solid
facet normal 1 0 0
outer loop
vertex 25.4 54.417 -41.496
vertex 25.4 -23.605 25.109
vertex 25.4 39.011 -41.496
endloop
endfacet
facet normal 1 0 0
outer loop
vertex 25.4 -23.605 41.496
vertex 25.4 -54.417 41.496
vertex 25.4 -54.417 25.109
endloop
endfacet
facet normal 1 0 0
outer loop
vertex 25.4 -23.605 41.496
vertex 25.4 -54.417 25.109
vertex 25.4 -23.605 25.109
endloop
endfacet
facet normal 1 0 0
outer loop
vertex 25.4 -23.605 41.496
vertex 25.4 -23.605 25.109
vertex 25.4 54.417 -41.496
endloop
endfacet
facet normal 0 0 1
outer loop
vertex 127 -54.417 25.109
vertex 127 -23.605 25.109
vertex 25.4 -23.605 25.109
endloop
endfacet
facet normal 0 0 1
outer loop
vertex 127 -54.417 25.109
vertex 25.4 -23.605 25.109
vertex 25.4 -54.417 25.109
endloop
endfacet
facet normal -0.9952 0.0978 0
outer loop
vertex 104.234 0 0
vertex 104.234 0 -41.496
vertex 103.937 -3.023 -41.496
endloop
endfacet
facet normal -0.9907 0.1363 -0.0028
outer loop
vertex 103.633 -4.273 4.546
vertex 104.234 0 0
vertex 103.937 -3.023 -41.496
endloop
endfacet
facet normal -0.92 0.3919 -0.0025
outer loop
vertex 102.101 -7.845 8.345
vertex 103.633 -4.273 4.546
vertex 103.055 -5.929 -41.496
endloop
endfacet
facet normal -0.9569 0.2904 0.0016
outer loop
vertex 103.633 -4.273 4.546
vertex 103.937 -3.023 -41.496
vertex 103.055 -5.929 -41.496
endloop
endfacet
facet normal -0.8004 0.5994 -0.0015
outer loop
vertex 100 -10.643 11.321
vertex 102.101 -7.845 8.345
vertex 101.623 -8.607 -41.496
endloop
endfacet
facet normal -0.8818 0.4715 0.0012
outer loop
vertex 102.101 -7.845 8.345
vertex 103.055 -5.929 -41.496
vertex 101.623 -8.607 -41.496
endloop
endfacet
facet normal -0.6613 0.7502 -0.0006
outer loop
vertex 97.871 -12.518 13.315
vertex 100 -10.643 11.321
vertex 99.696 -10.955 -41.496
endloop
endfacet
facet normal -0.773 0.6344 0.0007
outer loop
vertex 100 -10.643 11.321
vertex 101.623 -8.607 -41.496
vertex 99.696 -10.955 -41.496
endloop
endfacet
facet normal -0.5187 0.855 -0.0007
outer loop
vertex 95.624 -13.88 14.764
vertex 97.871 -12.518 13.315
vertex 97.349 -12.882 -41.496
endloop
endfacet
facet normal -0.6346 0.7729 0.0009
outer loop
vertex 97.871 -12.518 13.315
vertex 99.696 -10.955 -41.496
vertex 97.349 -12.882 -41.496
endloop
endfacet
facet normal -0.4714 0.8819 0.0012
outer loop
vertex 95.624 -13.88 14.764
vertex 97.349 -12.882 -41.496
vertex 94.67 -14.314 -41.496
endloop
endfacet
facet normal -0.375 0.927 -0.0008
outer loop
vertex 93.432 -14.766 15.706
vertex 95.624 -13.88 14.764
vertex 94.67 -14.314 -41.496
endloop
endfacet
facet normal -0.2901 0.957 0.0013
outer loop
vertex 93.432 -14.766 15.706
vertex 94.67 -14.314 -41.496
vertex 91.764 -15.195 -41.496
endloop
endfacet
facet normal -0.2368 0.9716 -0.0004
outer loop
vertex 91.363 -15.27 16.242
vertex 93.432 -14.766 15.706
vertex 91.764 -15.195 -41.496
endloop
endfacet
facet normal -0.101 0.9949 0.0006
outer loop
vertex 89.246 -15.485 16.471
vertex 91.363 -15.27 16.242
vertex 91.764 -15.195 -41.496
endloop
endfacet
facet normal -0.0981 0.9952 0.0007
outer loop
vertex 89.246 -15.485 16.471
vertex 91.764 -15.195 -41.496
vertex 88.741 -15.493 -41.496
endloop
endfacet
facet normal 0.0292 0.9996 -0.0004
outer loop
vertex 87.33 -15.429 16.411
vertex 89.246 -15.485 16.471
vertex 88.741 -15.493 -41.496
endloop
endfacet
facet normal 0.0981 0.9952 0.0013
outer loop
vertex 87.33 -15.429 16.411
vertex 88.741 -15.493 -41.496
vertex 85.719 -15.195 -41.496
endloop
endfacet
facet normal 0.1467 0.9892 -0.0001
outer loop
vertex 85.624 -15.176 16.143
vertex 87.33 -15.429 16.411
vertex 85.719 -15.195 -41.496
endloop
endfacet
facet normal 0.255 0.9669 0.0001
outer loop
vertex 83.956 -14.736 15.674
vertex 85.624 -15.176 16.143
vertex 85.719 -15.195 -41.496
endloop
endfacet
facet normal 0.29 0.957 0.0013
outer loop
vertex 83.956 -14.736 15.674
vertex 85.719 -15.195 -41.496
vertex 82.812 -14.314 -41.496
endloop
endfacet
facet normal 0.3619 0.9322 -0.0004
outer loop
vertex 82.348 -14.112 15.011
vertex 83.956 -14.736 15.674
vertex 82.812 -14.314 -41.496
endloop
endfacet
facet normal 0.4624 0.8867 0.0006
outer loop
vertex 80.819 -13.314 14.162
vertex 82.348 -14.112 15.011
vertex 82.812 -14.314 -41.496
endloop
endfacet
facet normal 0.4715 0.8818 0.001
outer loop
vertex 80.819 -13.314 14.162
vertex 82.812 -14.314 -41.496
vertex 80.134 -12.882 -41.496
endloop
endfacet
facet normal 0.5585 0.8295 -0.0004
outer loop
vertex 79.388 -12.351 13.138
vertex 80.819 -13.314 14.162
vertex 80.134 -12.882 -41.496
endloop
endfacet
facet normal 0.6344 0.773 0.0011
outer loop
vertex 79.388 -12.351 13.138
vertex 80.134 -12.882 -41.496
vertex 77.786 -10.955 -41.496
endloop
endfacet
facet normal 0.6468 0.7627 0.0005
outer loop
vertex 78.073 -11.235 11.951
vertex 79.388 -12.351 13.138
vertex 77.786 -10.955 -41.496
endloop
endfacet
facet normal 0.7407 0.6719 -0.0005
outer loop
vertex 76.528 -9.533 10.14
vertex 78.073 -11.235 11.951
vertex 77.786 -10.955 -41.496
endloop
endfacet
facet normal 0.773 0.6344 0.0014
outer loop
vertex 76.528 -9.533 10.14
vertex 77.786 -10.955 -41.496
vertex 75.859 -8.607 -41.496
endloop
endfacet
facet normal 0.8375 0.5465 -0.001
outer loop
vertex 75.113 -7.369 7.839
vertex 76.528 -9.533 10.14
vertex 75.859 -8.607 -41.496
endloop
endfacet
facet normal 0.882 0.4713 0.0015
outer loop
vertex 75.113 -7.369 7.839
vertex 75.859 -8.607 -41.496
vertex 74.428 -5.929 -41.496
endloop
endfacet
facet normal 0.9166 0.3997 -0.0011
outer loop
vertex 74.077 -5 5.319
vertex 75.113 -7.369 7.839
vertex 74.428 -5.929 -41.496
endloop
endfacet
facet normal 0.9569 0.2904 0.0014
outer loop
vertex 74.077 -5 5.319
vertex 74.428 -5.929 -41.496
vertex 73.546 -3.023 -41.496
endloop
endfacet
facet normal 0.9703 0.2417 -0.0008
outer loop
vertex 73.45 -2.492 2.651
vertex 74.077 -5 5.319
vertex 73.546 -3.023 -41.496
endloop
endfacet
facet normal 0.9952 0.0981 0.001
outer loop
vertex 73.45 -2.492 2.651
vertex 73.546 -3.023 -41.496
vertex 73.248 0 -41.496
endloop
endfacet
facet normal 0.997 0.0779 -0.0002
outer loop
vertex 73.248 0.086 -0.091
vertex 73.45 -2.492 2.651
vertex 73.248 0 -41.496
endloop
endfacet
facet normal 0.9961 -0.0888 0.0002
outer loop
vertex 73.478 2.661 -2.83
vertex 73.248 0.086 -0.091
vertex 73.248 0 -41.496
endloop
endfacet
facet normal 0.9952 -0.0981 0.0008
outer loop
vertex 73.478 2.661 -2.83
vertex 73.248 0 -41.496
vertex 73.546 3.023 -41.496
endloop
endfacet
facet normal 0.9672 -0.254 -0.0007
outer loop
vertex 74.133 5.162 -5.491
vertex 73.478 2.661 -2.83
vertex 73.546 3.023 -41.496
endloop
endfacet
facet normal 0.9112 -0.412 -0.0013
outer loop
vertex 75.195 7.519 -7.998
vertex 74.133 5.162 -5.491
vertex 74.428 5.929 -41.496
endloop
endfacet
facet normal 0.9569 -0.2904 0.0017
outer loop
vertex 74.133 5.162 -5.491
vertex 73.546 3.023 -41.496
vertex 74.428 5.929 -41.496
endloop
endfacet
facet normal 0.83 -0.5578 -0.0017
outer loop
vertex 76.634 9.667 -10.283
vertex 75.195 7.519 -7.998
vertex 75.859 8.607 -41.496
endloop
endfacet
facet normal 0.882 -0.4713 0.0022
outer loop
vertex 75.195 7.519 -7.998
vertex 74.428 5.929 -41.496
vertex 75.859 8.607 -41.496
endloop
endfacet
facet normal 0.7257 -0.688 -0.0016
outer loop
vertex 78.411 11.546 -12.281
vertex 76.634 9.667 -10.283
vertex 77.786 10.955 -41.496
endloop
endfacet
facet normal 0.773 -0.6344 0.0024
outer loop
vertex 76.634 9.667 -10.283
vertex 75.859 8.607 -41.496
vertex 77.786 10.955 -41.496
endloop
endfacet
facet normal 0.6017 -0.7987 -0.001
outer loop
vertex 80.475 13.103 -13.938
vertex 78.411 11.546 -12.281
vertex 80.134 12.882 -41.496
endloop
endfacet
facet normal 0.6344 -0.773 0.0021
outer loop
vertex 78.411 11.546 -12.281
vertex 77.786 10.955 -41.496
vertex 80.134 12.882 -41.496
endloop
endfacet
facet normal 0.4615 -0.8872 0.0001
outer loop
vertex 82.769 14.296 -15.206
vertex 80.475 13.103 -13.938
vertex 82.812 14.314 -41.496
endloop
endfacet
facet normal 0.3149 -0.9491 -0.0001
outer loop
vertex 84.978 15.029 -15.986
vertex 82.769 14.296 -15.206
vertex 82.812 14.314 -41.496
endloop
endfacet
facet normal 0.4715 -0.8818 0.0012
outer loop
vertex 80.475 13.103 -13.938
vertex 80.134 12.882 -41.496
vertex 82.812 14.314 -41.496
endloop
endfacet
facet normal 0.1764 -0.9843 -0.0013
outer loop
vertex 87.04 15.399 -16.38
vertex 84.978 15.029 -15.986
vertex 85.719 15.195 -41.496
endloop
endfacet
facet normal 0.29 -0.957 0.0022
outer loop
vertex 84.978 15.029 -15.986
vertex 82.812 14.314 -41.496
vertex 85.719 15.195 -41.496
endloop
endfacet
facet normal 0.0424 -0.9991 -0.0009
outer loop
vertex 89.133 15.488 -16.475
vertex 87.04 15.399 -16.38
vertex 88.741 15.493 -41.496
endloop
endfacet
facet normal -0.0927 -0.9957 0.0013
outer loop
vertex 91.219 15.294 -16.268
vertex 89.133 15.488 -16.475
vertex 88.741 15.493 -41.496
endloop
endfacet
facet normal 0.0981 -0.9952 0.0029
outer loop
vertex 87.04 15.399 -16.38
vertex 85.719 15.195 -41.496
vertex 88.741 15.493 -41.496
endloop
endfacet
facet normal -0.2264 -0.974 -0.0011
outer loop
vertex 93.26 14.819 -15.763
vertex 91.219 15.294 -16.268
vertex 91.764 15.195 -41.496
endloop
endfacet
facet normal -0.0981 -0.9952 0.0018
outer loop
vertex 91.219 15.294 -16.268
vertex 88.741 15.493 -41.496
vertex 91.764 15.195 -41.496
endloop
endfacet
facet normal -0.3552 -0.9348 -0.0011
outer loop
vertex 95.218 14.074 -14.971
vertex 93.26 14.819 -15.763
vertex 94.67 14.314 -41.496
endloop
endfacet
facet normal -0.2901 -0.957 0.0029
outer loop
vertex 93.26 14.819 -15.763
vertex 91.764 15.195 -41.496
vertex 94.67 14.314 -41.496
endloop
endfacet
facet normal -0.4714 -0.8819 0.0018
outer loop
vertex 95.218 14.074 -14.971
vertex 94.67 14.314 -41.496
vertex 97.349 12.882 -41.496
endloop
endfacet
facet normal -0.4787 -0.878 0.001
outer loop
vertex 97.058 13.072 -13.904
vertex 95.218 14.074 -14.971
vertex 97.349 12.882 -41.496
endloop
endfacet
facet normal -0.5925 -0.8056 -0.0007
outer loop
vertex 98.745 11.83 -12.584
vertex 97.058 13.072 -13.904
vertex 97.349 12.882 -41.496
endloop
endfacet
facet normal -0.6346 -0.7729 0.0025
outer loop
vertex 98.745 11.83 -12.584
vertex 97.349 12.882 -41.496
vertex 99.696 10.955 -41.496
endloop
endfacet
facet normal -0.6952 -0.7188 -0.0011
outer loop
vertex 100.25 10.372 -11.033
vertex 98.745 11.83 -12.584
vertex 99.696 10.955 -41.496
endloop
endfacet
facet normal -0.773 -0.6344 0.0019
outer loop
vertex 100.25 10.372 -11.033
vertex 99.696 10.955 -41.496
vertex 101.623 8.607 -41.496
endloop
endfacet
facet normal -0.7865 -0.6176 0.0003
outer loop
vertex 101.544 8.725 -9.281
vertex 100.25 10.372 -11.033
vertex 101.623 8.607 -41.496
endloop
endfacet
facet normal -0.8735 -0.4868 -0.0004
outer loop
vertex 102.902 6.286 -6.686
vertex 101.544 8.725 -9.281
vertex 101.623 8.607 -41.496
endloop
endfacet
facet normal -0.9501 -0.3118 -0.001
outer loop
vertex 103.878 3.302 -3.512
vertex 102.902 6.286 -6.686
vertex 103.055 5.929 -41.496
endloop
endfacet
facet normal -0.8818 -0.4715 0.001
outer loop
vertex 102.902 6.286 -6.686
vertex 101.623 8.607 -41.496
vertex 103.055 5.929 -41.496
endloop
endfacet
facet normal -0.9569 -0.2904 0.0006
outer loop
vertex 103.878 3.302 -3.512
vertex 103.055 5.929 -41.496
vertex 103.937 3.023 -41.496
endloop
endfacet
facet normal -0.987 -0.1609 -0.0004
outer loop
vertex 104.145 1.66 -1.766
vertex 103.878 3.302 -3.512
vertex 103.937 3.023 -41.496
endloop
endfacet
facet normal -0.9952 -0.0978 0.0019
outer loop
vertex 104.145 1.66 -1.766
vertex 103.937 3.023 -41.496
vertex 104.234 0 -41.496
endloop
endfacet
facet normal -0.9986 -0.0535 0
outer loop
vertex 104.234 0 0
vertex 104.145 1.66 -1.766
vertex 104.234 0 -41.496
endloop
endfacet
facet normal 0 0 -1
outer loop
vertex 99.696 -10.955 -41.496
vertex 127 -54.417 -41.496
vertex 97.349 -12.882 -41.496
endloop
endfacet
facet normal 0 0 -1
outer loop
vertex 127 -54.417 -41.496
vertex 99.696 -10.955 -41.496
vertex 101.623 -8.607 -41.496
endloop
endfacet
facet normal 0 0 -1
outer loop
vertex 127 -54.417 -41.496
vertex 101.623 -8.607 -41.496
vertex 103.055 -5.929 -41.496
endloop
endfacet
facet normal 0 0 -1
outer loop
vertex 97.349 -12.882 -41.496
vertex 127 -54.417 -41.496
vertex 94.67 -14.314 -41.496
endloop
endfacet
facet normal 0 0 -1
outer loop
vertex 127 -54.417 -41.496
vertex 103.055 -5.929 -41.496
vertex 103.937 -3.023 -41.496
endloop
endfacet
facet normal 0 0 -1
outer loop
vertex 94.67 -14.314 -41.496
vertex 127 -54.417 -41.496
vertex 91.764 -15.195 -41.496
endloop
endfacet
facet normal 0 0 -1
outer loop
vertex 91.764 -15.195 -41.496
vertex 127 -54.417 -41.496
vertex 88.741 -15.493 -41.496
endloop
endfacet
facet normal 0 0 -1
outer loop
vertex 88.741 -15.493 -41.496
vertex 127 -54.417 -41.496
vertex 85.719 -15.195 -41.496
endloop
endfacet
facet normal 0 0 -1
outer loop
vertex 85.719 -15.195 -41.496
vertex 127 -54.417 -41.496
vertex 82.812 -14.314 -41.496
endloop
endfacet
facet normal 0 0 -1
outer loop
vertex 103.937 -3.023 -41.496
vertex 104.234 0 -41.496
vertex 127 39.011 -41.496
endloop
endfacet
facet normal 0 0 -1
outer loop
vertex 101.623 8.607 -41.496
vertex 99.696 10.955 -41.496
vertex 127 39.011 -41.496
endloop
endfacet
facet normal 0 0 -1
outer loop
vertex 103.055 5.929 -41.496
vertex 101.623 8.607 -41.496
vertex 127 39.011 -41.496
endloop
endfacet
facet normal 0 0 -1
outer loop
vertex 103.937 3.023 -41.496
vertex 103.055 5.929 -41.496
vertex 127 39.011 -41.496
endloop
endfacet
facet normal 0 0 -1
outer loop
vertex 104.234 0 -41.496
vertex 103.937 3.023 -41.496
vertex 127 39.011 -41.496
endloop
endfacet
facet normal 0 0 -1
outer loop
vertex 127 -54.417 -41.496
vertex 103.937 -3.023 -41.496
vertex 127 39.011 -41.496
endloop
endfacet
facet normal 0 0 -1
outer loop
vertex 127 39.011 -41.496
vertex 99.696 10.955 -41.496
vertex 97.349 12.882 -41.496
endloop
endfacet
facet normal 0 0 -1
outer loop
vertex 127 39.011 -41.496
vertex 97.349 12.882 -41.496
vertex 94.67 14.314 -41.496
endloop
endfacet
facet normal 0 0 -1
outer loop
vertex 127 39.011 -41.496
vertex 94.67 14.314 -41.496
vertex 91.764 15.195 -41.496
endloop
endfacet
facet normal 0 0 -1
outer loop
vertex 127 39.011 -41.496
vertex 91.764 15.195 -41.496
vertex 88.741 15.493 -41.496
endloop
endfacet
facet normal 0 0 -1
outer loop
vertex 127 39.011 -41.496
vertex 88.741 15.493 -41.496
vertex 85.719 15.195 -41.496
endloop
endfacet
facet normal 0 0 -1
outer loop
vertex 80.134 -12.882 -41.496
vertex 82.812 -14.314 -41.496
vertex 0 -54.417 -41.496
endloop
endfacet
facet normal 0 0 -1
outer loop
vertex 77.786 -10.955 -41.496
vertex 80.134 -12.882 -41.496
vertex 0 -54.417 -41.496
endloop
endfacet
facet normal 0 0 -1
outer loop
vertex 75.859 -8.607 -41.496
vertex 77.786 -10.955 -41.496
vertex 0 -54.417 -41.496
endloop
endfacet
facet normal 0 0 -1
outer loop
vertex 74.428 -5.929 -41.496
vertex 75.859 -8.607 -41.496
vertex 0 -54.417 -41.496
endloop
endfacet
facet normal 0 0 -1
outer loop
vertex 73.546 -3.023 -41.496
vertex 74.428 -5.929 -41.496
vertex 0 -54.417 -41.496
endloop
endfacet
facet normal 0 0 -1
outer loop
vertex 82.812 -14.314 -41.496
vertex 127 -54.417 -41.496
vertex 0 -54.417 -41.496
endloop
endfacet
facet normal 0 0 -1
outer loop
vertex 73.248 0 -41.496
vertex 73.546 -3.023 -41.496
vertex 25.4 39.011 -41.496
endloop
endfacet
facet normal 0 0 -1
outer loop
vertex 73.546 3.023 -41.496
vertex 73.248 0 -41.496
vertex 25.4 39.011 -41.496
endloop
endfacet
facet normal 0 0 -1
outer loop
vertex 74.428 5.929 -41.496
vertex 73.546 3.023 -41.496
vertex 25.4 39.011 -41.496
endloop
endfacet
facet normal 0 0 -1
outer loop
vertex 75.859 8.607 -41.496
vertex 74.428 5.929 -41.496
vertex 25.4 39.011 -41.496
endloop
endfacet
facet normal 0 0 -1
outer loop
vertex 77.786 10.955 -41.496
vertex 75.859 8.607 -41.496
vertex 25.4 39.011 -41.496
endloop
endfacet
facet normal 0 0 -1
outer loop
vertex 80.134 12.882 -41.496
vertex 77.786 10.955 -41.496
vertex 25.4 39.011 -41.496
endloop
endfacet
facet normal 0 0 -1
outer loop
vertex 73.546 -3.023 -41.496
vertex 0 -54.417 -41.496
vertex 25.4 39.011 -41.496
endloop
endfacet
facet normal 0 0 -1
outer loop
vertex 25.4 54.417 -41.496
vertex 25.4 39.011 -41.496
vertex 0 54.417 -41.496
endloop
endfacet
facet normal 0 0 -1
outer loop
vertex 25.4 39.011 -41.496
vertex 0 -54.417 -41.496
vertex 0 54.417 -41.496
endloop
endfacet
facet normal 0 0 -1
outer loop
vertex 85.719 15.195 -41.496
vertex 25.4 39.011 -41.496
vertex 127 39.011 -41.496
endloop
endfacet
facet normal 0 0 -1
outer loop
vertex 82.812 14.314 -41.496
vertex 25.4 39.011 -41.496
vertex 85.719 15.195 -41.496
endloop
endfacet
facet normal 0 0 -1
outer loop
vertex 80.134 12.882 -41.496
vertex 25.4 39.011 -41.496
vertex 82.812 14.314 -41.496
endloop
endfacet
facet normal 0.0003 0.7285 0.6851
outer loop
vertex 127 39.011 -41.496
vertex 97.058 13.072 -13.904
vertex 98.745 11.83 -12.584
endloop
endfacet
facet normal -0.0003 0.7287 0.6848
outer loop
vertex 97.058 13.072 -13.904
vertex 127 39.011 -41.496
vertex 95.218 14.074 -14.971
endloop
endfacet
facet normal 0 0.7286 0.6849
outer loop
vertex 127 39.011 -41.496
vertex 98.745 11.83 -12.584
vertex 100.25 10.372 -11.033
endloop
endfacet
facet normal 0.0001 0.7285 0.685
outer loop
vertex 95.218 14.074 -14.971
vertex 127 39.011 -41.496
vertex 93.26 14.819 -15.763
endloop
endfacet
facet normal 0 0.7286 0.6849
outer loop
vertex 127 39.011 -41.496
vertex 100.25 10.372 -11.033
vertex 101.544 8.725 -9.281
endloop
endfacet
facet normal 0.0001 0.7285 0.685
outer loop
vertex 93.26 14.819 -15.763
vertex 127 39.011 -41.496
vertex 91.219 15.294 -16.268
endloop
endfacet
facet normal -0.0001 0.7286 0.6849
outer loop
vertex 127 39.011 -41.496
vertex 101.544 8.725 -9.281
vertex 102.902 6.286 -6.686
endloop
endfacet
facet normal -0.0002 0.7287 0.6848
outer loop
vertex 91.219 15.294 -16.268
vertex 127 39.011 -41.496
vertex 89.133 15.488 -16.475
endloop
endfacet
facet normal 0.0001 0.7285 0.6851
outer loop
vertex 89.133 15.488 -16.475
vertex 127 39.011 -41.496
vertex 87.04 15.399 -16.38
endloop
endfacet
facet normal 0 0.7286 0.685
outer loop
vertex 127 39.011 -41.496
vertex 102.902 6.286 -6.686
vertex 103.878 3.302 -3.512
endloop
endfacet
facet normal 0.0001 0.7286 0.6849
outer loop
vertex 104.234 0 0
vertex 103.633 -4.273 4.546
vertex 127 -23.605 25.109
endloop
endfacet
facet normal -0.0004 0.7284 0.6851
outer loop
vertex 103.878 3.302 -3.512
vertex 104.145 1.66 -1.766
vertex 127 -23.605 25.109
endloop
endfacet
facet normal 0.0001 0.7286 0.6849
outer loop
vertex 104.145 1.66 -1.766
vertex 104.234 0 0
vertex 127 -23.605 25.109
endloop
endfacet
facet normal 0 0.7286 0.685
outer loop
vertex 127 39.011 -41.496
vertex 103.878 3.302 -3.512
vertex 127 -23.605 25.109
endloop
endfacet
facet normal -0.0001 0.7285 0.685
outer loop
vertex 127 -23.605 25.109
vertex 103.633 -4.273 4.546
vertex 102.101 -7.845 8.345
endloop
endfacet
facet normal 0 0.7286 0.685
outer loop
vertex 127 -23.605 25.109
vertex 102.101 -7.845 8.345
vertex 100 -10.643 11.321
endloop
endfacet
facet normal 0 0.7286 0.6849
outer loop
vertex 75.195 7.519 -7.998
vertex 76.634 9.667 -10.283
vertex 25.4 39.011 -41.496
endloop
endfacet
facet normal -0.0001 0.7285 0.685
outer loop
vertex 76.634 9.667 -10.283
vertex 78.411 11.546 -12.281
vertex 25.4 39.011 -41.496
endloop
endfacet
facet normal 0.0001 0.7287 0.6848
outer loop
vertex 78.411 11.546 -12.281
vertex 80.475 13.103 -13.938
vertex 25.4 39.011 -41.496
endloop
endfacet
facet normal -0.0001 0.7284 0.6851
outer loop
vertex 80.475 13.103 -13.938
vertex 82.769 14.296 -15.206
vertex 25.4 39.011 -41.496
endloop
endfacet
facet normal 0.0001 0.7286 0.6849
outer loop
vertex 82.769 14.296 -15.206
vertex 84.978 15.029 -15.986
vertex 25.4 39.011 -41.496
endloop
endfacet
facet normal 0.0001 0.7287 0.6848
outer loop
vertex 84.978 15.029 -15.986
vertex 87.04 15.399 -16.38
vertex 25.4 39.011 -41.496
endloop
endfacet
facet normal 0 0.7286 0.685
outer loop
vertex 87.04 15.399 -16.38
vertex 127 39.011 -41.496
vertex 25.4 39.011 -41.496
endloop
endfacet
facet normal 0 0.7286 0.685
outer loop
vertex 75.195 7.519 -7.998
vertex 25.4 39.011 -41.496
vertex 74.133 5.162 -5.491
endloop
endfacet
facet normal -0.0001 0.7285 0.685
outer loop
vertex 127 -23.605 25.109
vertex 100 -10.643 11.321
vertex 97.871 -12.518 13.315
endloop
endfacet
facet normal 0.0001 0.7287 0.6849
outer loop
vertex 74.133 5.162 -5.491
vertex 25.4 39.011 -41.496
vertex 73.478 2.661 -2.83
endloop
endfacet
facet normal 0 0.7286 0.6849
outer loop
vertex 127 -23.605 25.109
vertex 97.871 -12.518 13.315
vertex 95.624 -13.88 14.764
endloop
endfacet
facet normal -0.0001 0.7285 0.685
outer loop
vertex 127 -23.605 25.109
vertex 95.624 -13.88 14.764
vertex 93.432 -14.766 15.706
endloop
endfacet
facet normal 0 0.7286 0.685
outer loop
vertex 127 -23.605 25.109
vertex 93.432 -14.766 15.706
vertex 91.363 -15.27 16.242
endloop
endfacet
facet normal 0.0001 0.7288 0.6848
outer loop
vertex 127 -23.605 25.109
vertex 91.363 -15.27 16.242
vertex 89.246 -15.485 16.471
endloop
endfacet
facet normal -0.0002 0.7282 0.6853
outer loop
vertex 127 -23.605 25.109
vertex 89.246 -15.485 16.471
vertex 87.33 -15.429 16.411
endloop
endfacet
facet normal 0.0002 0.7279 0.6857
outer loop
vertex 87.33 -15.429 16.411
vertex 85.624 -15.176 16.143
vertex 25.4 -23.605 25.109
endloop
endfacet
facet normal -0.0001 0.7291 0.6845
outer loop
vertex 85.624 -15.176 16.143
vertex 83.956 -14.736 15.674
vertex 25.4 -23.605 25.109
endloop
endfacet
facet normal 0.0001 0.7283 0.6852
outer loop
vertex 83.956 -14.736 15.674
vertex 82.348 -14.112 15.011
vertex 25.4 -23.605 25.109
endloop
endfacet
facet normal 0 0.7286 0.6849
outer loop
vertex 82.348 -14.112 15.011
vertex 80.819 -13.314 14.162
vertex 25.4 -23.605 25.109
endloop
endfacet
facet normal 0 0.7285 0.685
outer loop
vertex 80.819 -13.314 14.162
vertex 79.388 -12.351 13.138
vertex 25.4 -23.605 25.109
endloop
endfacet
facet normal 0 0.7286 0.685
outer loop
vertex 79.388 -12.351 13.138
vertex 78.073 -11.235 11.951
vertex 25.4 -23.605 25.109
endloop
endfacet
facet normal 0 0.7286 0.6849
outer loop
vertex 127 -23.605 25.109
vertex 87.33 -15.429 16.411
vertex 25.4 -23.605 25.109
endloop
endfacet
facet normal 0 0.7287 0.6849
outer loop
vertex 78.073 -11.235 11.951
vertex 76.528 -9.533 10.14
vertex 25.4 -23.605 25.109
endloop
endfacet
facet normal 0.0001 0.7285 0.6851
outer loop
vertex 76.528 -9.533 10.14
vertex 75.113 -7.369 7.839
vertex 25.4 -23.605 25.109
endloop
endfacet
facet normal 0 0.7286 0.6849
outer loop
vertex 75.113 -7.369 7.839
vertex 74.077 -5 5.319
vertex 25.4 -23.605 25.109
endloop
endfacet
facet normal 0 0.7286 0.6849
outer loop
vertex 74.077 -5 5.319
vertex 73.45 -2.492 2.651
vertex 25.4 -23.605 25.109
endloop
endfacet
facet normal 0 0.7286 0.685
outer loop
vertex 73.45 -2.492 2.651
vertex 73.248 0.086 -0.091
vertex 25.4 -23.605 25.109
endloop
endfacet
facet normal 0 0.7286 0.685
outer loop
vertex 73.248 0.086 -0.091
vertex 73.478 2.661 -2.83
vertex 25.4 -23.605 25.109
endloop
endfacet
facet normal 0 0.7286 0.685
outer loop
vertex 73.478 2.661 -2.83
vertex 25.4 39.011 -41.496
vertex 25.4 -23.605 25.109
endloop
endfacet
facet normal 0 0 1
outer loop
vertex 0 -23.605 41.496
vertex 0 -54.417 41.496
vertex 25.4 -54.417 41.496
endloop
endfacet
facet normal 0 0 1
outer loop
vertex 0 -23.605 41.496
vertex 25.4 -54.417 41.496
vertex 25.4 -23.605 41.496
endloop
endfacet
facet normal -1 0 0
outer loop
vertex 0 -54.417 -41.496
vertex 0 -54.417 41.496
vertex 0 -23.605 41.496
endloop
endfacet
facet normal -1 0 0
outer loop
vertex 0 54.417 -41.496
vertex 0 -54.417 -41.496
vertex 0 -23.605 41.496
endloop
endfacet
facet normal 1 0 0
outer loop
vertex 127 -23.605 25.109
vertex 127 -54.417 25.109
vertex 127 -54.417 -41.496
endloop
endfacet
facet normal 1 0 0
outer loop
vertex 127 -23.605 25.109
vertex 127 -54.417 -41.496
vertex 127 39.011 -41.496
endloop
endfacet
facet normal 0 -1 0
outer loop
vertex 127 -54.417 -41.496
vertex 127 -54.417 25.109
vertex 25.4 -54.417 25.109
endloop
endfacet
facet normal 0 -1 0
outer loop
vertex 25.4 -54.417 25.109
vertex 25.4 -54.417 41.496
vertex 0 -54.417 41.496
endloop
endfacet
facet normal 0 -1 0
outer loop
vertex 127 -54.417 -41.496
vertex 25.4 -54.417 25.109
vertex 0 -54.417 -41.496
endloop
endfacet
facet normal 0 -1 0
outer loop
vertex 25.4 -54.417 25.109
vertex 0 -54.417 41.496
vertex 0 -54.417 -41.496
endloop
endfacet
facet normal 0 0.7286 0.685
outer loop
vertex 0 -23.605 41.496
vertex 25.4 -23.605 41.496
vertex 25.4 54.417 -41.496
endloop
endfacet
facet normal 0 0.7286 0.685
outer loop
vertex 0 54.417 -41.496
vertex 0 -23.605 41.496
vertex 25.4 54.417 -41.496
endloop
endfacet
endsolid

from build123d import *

# Parameters (mm, degrees)
F0_W     = 108.833484
F0_H     = 82.991742
F1_DEPTH = 25.4
F3_DEPTH = 25.4
F5_DEPTH = 101.6
F6_R     = 15.493018
F7_DEPTH = 82.992742


with BuildPart() as f1:
    # F0 (on Right) → F1 (new body)
    with BuildSketch(Plane.YZ):
        Rectangle(F0_W, F0_H)
    extrude(amount=F1_DEPTH)

    # F2 (on face) → F3 (cut)
    with BuildSketch(Plane.YZ.offset(25.4)):
        Polygon((54.416742, 41.495871), (-23.605434, 41.495871), (54.416742, -41.495871), align=None)
    extrude(amount=-F3_DEPTH, mode=Mode.SUBTRACT)

    # F4 (on face) → F5 (join)
    with BuildSketch(Plane.YZ.offset(25.4)):
        Polygon((-54.416742, 25.108964), (-54.416742, -41.495871), (39.011087, -41.495871), (-23.605434, 25.108964), align=None)
    extrude(amount=F5_DEPTH)

    # F6 (on face) → F7 (cut, through all)
    with BuildSketch(Plane(origin=(0, 0, -41.495871), x_dir=(1, 0, 0), z_dir=(0, 0, -1))):
        with Locations((88.741258, 0)):
            Circle(F6_R)
    extrude(amount=-F7_DEPTH, mode=Mode.SUBTRACT)


solid = f1.part
